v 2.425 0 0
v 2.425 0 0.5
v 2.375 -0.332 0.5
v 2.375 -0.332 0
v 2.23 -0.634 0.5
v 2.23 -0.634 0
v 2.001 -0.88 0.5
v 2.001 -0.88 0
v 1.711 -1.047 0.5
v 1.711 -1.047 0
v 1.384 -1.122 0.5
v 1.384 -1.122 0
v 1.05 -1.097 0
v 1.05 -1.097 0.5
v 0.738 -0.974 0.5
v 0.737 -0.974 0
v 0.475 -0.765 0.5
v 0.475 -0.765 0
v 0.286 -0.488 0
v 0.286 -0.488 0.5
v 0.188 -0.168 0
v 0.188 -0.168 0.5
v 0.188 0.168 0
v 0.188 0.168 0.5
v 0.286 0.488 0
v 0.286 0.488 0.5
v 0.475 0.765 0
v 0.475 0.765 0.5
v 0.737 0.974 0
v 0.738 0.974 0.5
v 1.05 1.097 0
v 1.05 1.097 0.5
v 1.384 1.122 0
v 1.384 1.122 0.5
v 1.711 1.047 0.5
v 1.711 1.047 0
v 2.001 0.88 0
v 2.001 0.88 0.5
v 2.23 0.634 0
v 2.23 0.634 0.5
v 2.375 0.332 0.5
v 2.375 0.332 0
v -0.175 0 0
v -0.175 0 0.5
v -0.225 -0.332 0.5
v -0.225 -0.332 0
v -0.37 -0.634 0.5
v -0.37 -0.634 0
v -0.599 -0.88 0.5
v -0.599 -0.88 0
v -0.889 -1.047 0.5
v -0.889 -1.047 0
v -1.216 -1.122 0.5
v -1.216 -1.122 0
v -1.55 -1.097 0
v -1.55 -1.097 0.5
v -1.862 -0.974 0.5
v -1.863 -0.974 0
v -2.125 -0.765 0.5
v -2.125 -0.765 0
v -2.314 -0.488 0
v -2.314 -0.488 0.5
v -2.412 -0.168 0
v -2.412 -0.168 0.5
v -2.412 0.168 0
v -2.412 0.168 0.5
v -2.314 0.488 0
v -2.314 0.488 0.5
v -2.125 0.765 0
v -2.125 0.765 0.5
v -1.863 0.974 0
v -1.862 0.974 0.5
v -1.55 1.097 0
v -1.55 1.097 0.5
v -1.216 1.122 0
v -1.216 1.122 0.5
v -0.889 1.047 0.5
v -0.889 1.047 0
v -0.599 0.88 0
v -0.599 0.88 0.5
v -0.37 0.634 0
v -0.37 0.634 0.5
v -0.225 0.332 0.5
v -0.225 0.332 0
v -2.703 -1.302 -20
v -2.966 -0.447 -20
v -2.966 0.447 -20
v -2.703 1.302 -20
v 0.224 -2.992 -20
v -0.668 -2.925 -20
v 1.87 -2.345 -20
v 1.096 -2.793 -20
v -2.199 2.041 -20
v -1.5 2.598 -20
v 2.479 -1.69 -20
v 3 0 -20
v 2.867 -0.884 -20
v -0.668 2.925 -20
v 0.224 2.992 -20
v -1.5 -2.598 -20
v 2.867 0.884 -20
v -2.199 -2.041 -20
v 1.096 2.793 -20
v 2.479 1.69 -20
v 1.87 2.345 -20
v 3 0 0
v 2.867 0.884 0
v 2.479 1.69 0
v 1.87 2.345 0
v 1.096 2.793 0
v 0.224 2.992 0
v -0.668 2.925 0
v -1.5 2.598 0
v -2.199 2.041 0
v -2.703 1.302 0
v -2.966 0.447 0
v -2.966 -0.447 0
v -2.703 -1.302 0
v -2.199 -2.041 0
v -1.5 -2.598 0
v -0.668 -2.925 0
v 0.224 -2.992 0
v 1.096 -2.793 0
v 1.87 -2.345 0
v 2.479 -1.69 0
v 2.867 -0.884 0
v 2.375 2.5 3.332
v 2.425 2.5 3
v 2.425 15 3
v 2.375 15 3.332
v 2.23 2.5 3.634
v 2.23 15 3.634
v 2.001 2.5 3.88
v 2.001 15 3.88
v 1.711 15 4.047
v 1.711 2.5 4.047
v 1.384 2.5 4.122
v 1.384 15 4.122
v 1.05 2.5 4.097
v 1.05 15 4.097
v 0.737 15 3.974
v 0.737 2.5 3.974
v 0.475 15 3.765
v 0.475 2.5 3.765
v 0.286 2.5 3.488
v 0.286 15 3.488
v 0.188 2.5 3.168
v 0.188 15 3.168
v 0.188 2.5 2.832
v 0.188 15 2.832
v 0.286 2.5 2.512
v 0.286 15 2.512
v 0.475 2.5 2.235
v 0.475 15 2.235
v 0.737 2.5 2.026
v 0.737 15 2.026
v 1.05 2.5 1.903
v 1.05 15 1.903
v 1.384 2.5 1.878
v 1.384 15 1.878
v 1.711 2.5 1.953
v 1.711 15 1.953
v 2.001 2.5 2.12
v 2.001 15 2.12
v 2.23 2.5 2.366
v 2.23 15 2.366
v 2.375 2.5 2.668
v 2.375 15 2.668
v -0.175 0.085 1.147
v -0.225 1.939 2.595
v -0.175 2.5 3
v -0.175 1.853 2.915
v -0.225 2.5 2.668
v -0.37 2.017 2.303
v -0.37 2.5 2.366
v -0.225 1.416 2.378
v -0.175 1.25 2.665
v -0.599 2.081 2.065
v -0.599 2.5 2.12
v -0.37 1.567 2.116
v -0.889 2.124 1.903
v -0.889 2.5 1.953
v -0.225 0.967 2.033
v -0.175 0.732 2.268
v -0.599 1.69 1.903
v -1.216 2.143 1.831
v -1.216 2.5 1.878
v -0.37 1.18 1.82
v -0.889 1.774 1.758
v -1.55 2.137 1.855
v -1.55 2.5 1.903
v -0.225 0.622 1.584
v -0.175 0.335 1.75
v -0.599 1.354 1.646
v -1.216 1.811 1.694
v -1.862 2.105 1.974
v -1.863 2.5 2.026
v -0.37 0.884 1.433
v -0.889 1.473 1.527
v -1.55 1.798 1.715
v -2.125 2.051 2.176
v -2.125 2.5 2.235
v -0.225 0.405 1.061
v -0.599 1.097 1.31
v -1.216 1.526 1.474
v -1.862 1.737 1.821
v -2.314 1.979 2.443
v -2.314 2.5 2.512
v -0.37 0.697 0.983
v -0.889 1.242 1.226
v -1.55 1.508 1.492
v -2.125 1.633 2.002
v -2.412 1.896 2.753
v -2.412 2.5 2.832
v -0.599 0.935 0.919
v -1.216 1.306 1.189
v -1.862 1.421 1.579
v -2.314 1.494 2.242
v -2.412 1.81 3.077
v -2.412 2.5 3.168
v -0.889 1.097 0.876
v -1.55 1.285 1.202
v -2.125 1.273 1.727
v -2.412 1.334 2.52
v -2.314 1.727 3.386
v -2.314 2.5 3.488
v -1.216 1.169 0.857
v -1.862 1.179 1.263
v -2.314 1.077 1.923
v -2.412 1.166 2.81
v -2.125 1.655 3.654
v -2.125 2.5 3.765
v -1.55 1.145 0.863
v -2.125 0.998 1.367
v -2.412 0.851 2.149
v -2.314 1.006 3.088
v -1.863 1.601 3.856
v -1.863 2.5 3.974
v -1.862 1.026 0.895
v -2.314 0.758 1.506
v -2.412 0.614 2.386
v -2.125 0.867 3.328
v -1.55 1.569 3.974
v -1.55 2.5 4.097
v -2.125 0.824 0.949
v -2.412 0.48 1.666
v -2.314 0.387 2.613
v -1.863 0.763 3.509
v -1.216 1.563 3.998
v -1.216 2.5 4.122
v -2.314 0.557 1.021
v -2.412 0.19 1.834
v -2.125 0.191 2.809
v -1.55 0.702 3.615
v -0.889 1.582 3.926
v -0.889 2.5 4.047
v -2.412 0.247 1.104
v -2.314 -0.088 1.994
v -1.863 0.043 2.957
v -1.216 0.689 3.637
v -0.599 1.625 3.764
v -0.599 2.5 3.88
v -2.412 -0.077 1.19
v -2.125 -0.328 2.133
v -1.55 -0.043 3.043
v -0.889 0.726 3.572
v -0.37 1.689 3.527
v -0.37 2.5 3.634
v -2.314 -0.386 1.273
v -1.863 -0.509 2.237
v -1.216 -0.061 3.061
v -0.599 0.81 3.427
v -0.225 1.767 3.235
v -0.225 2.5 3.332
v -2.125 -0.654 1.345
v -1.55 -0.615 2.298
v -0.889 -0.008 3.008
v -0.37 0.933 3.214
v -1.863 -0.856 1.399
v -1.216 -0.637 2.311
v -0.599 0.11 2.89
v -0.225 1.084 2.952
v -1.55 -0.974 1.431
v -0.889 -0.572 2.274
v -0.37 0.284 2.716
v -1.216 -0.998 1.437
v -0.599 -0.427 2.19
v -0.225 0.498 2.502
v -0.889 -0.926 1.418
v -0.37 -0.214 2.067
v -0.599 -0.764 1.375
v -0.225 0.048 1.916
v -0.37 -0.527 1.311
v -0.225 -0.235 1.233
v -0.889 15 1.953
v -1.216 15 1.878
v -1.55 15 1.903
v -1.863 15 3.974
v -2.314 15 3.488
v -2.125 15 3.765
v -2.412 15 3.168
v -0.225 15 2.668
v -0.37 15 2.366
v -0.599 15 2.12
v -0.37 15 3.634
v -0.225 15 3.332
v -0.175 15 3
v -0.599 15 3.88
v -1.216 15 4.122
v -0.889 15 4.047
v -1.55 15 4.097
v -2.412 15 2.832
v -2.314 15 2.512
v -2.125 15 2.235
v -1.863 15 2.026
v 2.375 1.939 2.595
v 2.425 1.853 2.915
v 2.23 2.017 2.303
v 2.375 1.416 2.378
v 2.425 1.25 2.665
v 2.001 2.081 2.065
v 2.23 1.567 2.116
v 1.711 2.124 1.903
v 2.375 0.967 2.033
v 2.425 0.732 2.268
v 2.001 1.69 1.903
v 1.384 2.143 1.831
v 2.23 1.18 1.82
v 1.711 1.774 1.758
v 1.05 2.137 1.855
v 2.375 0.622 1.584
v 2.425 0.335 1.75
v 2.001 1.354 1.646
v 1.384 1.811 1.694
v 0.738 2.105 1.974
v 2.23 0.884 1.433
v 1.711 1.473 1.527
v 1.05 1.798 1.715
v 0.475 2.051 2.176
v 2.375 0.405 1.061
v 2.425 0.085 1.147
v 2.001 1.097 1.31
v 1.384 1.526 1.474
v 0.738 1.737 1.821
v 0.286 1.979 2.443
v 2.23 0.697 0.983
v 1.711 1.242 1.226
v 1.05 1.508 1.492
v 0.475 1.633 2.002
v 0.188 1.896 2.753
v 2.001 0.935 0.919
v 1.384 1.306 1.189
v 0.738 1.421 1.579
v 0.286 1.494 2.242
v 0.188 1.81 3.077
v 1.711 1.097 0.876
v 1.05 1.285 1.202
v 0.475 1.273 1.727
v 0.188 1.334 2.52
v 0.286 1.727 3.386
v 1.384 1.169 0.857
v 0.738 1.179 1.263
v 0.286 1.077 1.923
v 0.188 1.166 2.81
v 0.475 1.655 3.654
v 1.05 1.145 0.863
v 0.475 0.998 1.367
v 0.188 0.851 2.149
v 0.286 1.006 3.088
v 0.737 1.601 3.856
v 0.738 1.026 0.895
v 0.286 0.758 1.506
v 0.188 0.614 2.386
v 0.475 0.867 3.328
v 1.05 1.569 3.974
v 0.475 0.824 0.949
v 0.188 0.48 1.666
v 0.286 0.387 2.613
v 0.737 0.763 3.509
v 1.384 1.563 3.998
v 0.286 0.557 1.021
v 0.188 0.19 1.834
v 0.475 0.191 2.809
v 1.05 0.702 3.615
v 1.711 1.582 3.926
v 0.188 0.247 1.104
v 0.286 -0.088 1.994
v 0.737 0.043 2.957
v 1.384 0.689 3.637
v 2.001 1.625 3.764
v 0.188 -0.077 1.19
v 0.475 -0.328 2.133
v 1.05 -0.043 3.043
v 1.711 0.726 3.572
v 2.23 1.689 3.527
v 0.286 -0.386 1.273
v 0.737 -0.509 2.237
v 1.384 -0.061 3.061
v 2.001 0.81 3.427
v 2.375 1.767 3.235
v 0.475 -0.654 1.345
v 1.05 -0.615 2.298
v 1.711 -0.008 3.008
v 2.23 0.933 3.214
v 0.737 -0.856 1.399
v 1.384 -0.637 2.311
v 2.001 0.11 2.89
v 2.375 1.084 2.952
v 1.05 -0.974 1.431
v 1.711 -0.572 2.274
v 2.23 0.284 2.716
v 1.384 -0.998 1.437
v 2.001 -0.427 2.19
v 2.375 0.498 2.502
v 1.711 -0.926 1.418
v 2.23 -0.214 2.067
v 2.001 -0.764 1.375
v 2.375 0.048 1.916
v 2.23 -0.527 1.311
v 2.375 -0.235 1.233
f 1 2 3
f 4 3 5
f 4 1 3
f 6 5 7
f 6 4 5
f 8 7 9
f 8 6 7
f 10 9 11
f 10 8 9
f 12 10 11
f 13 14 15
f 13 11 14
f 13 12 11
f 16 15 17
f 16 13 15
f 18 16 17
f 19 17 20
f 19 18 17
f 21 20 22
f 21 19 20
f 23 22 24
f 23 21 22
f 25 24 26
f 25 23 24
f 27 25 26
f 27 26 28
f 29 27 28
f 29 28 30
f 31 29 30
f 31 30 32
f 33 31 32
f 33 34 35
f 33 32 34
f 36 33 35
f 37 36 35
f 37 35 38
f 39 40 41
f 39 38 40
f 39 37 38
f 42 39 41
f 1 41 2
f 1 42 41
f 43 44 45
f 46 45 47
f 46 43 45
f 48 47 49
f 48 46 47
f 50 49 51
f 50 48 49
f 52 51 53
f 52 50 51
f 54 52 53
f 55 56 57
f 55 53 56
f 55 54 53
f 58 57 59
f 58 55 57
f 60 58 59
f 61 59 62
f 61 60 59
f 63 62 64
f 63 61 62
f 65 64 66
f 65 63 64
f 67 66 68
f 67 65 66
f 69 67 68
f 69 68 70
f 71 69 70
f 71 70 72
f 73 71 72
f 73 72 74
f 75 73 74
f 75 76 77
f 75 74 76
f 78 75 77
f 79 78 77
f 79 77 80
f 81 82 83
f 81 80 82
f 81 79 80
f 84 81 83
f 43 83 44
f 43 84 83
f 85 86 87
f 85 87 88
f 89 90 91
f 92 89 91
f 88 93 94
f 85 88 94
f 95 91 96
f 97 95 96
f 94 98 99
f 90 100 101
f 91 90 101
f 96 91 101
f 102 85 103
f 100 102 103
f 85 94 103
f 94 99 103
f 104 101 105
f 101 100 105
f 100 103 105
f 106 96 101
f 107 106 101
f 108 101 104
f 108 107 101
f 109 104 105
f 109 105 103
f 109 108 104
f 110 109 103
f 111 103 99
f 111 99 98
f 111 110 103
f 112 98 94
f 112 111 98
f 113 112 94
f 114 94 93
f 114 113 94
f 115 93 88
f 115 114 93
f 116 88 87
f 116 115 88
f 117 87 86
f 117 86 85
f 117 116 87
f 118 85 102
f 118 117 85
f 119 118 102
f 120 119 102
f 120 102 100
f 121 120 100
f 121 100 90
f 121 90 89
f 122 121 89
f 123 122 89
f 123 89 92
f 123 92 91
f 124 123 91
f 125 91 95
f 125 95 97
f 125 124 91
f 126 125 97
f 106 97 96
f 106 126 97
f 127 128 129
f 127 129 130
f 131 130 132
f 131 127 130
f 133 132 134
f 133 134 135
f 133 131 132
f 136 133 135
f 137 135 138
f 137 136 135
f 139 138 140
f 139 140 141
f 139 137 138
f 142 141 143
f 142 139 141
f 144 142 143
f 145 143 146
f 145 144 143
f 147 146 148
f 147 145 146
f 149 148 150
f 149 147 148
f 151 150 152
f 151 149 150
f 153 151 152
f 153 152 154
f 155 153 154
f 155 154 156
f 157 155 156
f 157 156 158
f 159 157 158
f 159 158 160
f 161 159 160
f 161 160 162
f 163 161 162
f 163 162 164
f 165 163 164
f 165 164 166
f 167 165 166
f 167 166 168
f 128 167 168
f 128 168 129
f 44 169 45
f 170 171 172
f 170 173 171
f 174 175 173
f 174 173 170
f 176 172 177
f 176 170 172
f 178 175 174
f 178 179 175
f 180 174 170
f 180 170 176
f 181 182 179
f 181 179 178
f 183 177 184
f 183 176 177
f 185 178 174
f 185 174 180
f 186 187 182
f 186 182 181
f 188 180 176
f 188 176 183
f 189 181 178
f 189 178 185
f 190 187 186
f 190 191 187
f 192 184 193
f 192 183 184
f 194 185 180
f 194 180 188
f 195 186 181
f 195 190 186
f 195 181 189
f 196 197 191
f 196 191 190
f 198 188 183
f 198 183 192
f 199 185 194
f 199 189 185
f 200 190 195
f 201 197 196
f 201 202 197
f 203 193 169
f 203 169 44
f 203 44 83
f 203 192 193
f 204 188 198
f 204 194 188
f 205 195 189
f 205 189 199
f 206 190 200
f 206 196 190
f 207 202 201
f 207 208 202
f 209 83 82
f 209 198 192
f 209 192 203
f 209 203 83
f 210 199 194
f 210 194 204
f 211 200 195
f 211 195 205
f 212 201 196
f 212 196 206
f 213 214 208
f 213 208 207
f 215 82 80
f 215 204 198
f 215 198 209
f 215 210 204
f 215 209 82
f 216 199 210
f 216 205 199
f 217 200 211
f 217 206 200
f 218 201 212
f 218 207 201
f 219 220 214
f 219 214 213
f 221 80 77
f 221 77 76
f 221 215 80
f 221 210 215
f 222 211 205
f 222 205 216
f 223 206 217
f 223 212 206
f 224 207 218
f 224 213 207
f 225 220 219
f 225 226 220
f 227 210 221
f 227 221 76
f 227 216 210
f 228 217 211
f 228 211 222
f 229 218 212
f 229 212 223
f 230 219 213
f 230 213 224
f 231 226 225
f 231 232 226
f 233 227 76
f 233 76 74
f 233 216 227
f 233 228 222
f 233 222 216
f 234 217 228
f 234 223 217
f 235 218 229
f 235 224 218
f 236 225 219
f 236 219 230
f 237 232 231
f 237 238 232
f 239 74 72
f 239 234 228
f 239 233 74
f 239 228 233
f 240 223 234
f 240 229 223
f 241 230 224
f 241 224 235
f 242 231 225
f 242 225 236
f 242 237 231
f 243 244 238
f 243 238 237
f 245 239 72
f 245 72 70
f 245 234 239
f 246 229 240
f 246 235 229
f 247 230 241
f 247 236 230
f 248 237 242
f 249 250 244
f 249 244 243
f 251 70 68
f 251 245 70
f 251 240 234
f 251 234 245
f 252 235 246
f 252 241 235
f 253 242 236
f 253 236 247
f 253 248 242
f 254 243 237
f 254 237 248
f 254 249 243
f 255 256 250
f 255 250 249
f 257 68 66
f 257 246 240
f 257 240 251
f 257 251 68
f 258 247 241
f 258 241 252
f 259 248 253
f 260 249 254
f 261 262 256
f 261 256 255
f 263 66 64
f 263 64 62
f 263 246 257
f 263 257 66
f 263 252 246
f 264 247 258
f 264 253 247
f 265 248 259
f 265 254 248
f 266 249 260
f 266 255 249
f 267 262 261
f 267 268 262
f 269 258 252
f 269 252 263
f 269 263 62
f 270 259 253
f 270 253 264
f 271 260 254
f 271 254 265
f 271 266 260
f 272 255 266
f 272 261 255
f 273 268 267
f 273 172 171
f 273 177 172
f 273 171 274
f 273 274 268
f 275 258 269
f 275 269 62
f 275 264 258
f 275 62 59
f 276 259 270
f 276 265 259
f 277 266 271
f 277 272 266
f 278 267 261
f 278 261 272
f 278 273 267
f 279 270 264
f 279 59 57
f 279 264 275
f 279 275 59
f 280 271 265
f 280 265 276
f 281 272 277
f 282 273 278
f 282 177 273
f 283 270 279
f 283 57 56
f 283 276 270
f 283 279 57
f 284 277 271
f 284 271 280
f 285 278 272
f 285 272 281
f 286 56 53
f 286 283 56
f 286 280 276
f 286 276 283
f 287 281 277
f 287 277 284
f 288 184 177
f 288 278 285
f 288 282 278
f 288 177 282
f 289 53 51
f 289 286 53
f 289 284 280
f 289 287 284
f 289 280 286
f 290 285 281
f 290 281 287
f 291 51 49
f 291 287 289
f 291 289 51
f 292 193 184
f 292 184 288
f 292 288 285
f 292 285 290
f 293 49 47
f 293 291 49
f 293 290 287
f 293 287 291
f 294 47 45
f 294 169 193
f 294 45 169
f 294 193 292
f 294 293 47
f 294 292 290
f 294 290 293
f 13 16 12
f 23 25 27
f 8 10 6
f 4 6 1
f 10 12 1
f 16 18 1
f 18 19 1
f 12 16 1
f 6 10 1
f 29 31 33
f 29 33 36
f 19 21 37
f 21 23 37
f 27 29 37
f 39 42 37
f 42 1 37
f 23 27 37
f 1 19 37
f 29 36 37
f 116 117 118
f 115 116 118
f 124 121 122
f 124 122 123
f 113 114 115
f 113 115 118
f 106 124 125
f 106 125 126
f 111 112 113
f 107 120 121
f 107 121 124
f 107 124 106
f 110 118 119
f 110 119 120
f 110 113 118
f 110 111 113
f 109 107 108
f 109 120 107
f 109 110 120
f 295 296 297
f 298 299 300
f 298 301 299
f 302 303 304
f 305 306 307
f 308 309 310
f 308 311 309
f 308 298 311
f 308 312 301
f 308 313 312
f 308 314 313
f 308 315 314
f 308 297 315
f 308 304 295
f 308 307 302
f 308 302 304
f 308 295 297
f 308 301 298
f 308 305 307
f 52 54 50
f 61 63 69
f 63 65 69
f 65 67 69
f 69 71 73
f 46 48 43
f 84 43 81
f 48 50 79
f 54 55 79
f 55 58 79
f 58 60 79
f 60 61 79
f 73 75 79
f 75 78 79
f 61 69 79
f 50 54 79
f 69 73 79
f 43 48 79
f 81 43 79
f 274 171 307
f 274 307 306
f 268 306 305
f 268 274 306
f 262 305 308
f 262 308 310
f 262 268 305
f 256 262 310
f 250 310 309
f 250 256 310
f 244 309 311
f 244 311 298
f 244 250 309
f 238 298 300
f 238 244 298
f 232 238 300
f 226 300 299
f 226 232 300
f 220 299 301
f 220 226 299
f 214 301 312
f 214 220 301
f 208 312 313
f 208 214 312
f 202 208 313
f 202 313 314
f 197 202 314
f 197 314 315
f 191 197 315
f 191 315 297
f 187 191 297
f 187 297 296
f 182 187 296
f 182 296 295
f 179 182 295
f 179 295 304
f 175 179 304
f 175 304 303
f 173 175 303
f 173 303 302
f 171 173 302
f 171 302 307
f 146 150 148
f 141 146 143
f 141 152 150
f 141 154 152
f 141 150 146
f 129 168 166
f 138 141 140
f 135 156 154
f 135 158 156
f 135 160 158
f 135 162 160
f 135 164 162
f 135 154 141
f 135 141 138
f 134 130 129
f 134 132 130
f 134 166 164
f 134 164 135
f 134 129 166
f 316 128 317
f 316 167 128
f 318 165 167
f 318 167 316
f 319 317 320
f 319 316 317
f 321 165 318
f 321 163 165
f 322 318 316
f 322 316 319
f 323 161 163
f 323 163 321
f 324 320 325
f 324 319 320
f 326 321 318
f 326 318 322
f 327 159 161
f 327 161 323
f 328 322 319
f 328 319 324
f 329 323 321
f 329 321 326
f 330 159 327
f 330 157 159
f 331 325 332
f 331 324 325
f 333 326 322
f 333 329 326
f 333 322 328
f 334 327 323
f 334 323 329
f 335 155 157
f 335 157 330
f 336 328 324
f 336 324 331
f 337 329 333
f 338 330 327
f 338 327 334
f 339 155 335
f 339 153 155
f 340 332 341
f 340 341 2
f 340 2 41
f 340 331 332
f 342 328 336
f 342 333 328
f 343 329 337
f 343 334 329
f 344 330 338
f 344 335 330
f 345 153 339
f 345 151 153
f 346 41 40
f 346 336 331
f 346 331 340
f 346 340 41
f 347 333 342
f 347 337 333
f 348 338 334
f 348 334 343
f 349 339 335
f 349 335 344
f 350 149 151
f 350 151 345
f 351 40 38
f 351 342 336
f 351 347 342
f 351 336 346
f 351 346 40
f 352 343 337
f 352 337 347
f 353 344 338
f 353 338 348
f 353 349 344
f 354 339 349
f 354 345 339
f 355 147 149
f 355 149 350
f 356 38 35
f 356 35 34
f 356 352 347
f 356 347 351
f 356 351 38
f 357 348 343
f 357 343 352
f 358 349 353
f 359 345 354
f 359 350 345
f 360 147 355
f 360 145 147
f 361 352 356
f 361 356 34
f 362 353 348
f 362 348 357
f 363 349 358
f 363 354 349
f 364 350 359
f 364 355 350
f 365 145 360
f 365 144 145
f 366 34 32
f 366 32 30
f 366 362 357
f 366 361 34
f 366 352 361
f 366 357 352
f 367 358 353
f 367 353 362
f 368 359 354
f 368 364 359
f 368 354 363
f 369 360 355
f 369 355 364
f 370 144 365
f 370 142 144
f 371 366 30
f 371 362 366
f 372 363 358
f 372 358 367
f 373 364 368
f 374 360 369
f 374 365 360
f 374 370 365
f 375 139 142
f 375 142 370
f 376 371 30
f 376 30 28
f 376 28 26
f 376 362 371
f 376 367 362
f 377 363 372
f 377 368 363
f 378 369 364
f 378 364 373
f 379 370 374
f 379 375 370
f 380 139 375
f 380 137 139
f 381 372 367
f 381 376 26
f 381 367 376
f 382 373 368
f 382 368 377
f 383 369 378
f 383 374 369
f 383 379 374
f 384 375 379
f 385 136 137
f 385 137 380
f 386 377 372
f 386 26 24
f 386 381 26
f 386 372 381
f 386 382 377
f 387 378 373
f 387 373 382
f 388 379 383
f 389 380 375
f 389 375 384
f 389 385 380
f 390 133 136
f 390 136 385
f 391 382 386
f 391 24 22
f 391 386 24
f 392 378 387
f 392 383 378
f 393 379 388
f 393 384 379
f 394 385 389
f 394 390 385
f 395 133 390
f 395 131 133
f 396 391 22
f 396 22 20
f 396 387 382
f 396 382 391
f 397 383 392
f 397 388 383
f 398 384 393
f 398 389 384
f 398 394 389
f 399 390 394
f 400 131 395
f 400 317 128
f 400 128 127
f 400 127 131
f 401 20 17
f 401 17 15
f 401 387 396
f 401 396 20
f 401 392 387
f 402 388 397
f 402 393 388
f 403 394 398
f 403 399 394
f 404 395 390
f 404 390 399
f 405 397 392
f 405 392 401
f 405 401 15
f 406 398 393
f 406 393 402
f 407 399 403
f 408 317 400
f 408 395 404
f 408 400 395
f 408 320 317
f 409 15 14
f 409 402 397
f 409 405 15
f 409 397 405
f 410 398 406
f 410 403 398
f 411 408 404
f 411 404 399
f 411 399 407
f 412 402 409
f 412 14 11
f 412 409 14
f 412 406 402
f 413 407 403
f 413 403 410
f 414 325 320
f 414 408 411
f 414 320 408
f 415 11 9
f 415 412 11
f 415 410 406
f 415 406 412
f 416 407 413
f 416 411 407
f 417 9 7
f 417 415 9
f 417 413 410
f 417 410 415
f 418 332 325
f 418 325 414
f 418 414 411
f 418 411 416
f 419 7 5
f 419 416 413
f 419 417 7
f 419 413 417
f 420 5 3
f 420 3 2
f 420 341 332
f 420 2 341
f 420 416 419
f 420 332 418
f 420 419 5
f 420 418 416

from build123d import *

# Parameters (mm, degrees)
SKETCH4_R           = 3
BOSS_EXTRUDE1_DEPTH = 20
SKETCH5_R           = 1.125
SKETCH10_R          = 1.125


with BuildPart() as part:
    # Sketch4 → Boss-Extrude1 (new body)
    with BuildSketch(Plane.XY):
        Circle(SKETCH4_R)
    extrude(amount=-BOSS_EXTRUDE1_DEPTH)


with BuildPart() as body_2:
    # Sweep2: sweep along a path in Sketch9
    with BuildLine(Plane.ZY.offset(2.55)) as sweep2_path:
        Line((3, 15), (3, 2.5))
        ThreePointArc((3, 2.5), (2.267766953, 0.732233047), (0.5, 0))
        Line((0.5, 0), (0, 0))
    # Sketch5 → Sweep2 (sweep)
    with BuildSketch(Plane.XY):
        with Locations((-1.3, 0)):
            Circle(SKETCH5_R)
    sweep(path=sweep2_path.line)


with BuildPart() as body_3:
    # Sweep3: sweep along a path in Sketch15
    with BuildLine(Plane.ZY.offset(-0.05)) as sweep3_path:
        Line((3, 15), (3, 2.5))
        ThreePointArc((3, 2.5), (2.267766953, 0.732233047), (0.5, 0))
        Line((0.5, 0), (0, 0))
    # Sketch10 → Sweep3 (sweep)
    with BuildSketch(Plane.XY):
        with Locations((1.3, 0)):
            Circle(SKETCH10_R)
    sweep(path=sweep3_path.line)


solid = Compound([part.part, body_2.part, body_3.part])
